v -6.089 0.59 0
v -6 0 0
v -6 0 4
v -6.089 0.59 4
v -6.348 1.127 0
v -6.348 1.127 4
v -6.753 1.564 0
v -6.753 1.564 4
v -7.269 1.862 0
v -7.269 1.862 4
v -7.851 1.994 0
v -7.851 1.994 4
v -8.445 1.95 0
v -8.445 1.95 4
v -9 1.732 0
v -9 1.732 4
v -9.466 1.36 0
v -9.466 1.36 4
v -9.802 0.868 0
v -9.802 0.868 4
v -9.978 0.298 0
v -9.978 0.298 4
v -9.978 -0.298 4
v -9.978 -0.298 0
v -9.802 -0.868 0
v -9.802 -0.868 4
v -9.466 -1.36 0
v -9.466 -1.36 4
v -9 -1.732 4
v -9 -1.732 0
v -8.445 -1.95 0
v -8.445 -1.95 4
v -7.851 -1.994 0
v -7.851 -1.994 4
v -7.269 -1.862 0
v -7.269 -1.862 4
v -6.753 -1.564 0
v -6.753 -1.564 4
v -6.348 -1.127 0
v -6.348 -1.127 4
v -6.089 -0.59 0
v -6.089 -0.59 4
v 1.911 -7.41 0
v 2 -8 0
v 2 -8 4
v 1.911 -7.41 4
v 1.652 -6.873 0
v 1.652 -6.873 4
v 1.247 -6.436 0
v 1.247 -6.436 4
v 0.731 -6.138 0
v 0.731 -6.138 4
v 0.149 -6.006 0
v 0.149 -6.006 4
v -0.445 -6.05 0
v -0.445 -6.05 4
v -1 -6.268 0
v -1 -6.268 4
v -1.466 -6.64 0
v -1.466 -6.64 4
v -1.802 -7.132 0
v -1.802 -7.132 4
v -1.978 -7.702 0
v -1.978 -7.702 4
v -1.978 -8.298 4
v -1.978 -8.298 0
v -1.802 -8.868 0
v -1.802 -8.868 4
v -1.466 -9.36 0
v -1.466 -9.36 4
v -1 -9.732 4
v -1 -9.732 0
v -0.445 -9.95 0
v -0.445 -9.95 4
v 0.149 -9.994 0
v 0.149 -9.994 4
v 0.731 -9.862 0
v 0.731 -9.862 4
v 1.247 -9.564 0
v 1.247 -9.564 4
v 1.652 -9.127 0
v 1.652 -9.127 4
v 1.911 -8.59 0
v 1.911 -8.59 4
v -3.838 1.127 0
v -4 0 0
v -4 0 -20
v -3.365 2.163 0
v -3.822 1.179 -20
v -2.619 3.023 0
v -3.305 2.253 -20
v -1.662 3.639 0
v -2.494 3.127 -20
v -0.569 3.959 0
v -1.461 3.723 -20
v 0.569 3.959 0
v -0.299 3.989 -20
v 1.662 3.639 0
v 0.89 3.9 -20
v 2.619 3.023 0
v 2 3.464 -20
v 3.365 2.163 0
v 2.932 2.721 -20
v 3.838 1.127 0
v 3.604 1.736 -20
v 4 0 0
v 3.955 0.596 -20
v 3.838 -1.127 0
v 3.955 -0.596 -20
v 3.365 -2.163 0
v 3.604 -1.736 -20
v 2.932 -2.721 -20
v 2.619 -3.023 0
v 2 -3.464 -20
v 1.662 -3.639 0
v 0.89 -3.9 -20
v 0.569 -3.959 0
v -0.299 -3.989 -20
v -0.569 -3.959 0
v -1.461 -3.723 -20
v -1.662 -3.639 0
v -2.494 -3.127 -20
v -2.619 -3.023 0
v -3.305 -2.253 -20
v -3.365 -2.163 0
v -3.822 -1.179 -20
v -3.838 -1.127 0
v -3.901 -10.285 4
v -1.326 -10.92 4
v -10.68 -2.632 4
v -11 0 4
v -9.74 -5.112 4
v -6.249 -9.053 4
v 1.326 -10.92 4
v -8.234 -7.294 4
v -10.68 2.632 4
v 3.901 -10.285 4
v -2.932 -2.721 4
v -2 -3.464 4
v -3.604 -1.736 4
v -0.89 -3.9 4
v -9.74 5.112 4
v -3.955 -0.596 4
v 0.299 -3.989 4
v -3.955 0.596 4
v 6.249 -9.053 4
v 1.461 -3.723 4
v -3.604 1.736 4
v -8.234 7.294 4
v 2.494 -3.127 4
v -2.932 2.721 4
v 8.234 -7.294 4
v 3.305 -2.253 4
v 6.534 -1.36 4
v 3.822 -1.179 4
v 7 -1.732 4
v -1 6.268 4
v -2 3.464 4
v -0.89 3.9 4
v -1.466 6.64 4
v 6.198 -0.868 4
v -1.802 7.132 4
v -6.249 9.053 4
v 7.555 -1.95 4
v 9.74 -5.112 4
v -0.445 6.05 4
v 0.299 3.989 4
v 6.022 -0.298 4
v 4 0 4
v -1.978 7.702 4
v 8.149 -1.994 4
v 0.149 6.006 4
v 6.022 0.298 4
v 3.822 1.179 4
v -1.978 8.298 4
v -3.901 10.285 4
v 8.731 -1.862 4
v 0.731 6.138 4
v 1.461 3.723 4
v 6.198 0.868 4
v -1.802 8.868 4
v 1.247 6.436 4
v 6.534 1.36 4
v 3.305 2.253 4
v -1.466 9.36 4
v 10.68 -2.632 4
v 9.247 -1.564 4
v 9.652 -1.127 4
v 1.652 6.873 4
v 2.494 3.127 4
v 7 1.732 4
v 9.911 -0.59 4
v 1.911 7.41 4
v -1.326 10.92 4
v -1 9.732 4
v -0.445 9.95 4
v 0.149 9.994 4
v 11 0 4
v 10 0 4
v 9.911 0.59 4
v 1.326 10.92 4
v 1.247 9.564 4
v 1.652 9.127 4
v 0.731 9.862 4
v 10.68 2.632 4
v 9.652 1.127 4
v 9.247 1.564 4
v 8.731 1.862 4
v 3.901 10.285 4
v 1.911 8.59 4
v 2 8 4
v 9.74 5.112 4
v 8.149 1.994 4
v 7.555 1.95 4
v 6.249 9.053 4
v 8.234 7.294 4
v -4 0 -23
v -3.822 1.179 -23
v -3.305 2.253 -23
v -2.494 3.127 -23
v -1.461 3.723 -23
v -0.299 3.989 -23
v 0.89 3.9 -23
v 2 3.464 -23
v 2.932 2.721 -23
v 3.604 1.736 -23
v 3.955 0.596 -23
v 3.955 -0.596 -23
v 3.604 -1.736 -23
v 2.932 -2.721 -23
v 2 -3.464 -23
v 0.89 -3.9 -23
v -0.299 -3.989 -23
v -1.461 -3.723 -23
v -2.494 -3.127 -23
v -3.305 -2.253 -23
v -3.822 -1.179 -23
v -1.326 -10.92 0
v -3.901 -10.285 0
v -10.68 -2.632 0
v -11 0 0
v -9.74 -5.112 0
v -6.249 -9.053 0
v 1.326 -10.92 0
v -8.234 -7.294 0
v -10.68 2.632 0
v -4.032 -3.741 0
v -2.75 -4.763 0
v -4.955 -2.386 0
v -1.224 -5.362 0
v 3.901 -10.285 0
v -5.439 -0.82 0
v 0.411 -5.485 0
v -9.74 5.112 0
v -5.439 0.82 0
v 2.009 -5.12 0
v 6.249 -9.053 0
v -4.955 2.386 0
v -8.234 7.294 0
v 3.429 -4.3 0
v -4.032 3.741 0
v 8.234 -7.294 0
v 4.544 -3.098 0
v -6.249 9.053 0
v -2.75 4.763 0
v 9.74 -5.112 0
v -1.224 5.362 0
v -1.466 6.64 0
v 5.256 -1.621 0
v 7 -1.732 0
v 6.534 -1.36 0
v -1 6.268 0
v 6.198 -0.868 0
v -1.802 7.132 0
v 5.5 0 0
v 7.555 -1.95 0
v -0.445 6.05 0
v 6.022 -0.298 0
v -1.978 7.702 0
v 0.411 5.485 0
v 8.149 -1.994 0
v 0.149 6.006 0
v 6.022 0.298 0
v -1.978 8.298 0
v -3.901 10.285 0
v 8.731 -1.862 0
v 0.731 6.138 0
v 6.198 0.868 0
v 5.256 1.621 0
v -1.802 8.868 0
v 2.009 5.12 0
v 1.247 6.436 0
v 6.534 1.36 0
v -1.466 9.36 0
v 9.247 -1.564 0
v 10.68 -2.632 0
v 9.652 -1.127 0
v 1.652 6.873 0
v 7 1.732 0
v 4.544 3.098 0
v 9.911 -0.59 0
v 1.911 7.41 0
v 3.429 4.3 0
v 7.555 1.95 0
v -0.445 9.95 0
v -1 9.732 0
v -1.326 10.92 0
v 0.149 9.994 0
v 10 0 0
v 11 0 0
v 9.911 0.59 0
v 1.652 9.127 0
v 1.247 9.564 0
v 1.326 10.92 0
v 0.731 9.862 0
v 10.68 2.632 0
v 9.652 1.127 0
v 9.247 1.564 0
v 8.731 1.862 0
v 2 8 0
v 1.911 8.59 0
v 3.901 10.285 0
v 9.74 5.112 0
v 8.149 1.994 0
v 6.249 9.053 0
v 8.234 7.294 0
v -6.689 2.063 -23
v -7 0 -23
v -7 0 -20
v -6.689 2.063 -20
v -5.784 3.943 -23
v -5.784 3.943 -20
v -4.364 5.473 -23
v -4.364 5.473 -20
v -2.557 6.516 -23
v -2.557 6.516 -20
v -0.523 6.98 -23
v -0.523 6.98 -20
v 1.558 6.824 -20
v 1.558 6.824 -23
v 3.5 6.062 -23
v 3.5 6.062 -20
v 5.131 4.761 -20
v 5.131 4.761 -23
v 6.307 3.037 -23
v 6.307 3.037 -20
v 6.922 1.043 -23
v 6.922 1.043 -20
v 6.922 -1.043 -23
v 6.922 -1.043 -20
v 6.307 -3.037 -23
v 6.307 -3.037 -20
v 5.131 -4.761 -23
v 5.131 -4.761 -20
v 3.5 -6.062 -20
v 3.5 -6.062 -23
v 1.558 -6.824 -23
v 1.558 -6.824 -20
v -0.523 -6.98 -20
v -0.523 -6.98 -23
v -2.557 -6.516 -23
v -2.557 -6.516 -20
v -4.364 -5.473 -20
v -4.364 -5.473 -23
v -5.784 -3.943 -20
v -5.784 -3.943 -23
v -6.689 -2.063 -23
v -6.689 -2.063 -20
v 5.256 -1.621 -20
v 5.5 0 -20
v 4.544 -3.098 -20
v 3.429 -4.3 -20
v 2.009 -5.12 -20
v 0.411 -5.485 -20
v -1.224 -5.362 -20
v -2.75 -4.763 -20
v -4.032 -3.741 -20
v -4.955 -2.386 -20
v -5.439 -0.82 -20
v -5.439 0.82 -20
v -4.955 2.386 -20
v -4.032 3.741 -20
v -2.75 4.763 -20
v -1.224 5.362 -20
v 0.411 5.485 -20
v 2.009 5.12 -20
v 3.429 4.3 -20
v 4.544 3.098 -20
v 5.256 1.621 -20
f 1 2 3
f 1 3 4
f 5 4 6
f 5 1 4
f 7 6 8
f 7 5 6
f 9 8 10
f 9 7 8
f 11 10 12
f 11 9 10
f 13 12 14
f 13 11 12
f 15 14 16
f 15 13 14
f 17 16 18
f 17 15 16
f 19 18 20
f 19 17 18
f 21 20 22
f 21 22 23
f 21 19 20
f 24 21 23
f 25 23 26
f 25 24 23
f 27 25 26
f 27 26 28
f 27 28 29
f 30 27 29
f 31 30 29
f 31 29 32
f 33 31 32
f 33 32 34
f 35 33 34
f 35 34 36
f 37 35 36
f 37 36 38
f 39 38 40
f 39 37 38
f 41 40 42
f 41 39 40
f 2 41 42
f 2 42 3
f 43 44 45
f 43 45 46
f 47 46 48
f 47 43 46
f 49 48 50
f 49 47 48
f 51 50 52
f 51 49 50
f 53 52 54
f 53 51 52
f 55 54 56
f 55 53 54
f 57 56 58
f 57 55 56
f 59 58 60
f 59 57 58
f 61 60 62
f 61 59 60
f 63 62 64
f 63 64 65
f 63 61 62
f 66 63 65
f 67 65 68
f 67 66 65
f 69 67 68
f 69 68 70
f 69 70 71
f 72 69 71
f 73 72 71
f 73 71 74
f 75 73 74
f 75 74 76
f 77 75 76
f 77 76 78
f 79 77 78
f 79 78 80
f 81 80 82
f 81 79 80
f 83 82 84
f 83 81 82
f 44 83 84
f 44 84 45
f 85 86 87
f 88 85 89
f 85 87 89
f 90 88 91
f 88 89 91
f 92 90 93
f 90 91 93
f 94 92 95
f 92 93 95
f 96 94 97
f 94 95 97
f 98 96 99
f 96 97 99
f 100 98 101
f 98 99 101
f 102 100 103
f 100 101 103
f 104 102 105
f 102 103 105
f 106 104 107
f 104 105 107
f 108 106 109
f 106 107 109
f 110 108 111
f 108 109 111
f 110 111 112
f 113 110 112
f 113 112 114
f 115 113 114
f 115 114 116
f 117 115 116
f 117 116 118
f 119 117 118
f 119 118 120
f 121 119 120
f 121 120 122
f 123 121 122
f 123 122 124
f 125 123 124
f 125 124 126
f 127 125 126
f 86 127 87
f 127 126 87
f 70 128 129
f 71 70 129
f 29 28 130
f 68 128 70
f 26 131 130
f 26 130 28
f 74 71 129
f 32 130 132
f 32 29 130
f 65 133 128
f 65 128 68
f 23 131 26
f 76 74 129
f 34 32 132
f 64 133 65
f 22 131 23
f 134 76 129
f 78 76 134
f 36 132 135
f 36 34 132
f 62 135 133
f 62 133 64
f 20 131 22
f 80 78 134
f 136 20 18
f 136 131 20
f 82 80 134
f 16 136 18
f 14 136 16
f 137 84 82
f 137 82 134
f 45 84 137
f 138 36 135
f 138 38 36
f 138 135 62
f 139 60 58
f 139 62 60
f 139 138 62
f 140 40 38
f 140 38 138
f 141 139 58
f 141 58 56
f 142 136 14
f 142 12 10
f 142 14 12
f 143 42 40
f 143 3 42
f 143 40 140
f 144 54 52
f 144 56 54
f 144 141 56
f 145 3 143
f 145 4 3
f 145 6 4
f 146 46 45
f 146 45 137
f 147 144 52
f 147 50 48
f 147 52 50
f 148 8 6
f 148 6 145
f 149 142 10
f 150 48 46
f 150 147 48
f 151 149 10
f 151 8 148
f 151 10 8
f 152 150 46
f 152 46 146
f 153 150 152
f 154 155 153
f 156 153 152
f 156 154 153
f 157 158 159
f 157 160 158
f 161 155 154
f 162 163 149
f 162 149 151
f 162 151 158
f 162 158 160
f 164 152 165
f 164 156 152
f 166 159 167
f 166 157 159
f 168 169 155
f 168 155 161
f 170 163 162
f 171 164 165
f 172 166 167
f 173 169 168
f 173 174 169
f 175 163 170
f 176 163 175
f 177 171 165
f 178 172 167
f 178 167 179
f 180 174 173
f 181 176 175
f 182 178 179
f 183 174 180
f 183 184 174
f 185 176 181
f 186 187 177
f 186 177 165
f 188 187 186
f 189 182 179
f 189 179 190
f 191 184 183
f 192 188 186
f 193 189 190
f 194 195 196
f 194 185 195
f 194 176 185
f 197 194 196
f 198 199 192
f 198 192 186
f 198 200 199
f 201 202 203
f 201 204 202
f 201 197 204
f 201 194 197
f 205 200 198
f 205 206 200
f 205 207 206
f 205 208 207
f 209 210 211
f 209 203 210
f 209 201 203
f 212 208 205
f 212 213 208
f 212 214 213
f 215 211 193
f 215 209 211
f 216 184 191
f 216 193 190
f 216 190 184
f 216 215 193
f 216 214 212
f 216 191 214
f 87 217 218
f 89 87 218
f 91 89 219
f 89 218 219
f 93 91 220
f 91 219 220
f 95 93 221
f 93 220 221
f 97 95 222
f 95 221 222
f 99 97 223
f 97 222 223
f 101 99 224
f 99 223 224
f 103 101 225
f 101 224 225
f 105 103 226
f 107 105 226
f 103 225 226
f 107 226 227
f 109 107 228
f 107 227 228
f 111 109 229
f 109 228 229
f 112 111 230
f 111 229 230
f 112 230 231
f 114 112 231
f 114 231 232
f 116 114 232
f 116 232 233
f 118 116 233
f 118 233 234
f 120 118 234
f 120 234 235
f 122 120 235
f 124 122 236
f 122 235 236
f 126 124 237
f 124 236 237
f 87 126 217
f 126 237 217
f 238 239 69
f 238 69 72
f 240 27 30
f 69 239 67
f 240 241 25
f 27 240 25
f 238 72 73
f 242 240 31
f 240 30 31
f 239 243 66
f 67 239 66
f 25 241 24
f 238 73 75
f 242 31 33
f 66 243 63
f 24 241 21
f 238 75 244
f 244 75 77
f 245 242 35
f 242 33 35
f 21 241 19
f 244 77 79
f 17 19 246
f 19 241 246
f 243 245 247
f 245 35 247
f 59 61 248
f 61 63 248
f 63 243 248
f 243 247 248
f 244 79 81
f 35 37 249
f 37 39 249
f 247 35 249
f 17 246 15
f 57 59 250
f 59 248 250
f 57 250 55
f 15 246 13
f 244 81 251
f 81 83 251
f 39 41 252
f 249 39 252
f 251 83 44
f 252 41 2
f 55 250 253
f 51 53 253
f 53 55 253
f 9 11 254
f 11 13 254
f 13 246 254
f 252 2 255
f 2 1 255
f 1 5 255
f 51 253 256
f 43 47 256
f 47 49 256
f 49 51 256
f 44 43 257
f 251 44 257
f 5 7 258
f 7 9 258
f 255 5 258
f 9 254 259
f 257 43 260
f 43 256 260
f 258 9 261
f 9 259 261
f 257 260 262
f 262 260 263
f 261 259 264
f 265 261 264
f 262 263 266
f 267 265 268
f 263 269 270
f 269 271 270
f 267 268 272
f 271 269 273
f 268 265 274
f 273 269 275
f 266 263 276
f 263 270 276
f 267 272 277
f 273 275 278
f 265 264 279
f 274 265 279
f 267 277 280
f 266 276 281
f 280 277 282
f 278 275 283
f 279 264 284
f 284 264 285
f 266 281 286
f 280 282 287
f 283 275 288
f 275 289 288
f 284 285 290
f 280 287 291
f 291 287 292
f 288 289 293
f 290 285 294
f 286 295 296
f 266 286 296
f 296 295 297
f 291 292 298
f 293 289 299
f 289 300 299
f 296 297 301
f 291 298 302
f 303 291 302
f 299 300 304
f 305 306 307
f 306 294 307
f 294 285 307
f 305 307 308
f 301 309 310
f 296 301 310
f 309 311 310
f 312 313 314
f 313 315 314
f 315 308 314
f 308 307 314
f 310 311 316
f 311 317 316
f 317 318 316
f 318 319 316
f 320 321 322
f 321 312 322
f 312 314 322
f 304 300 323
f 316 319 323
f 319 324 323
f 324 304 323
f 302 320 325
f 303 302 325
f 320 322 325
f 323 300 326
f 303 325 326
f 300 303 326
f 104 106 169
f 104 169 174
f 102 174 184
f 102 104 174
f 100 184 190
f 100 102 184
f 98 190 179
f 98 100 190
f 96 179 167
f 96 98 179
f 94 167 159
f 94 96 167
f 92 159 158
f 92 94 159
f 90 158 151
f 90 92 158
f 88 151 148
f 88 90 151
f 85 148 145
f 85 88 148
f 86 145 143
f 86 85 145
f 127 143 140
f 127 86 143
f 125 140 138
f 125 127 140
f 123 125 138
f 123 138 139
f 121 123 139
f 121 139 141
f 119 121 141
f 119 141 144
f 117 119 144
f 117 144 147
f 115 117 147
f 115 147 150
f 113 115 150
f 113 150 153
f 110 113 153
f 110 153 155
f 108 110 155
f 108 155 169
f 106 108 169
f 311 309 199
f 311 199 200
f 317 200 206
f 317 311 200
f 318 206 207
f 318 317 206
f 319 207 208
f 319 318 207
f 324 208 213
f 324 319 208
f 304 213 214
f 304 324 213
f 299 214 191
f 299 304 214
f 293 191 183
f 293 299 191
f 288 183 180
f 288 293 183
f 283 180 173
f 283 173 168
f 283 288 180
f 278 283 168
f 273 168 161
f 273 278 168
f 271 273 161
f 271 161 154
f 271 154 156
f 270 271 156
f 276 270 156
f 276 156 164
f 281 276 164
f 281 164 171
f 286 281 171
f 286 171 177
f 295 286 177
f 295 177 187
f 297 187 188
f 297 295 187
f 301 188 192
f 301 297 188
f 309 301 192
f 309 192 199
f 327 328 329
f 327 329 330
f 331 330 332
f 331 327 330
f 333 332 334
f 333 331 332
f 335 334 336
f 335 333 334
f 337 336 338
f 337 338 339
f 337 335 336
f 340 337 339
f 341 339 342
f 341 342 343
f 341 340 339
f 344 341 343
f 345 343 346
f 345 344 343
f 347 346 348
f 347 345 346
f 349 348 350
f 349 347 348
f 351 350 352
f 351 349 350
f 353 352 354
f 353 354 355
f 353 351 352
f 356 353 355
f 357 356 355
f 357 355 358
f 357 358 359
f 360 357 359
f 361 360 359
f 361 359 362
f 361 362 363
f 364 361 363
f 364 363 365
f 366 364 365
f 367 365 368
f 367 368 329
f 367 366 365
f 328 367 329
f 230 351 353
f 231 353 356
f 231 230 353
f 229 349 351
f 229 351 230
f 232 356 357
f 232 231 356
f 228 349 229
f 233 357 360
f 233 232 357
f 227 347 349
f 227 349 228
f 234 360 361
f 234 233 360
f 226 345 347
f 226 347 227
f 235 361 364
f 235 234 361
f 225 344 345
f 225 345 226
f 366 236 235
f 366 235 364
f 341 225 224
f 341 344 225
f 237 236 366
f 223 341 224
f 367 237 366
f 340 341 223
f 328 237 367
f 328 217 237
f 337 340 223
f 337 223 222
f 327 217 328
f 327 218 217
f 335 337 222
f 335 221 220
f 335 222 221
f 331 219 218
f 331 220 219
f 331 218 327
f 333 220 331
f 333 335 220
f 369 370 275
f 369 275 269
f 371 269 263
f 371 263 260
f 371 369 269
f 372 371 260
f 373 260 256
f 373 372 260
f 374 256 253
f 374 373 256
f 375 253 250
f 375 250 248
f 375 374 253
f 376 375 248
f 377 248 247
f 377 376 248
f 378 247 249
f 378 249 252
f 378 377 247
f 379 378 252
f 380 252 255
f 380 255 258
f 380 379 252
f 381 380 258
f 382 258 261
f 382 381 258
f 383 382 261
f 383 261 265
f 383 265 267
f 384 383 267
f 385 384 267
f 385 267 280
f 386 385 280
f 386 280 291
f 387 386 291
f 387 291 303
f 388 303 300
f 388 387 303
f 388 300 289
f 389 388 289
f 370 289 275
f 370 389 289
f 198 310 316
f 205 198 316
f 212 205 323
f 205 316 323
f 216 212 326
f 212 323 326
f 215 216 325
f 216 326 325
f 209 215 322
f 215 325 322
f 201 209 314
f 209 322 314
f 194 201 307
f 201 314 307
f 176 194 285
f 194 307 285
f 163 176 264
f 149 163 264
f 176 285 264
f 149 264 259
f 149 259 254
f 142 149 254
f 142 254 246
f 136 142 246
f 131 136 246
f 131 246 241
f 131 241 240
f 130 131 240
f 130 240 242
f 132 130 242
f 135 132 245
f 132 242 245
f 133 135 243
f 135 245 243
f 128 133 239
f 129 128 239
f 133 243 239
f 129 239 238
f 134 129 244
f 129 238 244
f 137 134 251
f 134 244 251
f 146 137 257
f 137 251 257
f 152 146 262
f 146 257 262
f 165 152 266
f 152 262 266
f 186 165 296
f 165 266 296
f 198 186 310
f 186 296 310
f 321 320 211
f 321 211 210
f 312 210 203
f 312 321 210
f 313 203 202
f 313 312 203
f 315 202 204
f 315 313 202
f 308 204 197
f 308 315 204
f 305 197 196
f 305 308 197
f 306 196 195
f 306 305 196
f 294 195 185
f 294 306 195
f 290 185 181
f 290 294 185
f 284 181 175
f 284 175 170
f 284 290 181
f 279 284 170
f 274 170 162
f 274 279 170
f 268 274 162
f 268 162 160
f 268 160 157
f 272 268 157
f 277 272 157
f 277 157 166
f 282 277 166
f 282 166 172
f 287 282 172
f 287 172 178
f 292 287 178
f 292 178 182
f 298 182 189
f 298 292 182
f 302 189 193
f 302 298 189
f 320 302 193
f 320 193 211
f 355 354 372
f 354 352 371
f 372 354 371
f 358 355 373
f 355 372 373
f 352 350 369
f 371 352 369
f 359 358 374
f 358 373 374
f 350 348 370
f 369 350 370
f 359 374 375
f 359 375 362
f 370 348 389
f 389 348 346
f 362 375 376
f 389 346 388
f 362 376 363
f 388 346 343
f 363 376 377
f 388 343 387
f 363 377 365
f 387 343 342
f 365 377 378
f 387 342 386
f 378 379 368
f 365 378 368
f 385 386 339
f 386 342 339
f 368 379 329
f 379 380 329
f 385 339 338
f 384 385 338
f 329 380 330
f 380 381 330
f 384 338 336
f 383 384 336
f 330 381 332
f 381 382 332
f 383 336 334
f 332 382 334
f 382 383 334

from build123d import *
from build123d.topology import SkipClean

# Parameters (mm, degrees)
SKETCH_1_R      = 11
SKETCH_1_R_2    = 2
SKETCH_1_R_3    = 4
EXTRUDE_1_DEPTH = 4
EXTRUDE_START   = 20
SKETCH_2_R      = 5.5
SKETCH_2_R_2    = 4
EXTRUDE_2_DEPTH = 20
EXTRUDE_START_2 = 3
SKETCH_3_R      = 7
SKETCH_3_R_2    = 4
EXTRUDE_3_DEPTH = 3


with BuildPart() as part:
    # 草图1 → 凸台-拉伸1 (new body)
    with BuildSketch(Plane.XY):
        Circle(SKETCH_1_R)
        with Locations((0, 8)):
            Circle(SKETCH_1_R_2, mode=Mode.SUBTRACT)
        with Locations((8, 0)):
            Circle(SKETCH_1_R_2, mode=Mode.SUBTRACT)
        with Locations((0, -8)):
            Circle(SKETCH_1_R_2, mode=Mode.SUBTRACT)
        with Locations((-8, 0)):
            Circle(SKETCH_1_R_2, mode=Mode.SUBTRACT)
        Circle(SKETCH_1_R_3, mode=Mode.SUBTRACT)
    extrude(amount=EXTRUDE_1_DEPTH)

    # 草图2 → 凸台-拉伸2 (add)
    with SkipClean():  # the faces are left unmerged after this step: merging them gives an invalid solid
        with BuildSketch(Plane(origin=(0, 0, 0), x_dir=(-1, 0, 0), z_dir=(0, 0, -1)).offset(EXTRUDE_START)):
            with Locations(Location((0, 0, 0), (0, 0, 180))):
                Circle(SKETCH_2_R)
            Circle(SKETCH_2_R_2, mode=Mode.SUBTRACT)
        extrude(amount=-EXTRUDE_2_DEPTH)

    # 草图3 → 凸台-拉伸3 (add)
    with SkipClean():  # the faces are left unmerged after this step: merging them gives an invalid solid
        with BuildSketch(Plane(origin=(0, 0, -20), x_dir=(-1, 0, 0), z_dir=(0, 0, -1)).offset(EXTRUDE_START_2)):
            Circle(SKETCH_3_R)
            Circle(SKETCH_3_R_2, mode=Mode.SUBTRACT)
        extrude(amount=-EXTRUDE_3_DEPTH)


solid = part.part
